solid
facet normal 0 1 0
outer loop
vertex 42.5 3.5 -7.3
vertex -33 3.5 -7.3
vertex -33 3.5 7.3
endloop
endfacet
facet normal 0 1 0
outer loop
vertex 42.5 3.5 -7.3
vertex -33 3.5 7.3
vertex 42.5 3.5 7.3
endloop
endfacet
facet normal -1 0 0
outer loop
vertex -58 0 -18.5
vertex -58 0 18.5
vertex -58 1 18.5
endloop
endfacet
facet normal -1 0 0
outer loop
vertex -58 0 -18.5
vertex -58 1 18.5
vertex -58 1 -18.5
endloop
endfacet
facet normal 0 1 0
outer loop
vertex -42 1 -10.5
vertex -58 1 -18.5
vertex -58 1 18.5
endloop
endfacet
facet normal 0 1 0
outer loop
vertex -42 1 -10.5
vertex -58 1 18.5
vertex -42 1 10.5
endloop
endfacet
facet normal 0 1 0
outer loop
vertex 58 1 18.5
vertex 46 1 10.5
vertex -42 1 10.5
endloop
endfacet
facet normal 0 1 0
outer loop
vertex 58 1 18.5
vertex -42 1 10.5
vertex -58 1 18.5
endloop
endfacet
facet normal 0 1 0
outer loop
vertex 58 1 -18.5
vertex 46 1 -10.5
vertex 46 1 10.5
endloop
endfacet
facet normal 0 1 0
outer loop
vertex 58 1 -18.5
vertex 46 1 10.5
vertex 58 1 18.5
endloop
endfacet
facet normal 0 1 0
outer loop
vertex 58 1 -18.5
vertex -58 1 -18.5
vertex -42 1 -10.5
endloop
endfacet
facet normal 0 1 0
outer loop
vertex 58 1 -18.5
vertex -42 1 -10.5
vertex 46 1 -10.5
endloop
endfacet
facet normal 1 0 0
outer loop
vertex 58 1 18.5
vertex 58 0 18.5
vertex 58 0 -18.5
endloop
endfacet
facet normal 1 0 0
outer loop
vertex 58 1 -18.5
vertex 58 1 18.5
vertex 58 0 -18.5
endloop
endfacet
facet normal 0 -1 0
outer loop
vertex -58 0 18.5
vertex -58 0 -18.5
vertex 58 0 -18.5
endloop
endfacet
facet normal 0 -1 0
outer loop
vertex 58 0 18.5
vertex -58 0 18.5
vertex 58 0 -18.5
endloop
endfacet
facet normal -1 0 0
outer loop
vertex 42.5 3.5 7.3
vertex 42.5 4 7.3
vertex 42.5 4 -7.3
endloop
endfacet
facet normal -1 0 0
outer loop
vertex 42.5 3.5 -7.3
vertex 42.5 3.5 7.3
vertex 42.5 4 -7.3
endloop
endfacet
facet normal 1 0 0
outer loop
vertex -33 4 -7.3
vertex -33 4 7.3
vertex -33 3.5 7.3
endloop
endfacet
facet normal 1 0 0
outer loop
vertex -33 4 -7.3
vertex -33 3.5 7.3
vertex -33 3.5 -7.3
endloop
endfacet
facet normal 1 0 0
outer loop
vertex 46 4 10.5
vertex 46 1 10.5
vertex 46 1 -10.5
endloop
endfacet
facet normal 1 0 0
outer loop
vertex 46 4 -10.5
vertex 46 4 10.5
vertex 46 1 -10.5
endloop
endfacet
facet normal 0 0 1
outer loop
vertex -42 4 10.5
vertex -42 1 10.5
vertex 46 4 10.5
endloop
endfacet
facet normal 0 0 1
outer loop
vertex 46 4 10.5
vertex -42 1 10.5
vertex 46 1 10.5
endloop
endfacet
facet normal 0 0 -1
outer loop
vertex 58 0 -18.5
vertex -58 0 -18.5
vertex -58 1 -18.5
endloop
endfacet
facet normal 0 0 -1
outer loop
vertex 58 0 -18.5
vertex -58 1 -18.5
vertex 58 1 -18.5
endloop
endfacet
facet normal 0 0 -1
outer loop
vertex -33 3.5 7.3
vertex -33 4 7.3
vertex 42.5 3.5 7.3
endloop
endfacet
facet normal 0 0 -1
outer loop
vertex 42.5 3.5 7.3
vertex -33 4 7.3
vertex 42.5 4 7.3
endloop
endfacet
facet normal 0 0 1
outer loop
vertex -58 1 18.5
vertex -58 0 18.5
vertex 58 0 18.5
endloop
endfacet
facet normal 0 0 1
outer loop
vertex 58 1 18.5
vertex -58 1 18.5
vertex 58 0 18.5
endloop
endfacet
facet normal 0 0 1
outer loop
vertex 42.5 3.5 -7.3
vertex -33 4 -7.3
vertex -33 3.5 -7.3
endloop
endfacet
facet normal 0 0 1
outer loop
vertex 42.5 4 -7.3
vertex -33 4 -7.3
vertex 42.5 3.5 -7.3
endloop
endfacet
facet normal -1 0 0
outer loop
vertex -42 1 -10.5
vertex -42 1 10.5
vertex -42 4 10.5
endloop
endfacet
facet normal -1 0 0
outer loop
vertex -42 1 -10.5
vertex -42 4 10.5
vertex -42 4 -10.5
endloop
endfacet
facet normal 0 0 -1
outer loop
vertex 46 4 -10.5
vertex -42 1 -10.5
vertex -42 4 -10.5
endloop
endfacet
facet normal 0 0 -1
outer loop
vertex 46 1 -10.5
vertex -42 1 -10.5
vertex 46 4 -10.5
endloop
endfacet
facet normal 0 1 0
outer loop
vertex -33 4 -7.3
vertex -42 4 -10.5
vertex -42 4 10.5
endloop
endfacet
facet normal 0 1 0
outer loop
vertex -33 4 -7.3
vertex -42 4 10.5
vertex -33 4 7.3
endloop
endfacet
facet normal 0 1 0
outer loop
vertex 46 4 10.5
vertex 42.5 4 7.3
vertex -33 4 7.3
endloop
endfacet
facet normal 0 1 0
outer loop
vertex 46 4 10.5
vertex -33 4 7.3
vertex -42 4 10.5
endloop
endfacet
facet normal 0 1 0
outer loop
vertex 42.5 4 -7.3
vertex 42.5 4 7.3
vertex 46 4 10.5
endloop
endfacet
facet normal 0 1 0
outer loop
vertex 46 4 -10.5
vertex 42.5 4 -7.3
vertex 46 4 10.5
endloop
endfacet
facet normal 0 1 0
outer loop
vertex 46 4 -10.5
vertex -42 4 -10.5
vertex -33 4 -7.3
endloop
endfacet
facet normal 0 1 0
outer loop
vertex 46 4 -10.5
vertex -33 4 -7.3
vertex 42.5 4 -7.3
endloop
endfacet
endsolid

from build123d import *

# Parameters (mm, degrees)
SKETCH1_W           = 116
SKETCH1_H           = 37
BOSS_EXTRUDE1_DEPTH = 1
SKETCH2_W           = 88
SKETCH2_H           = 21
BOSS_EXTRUDE2_DEPTH = 3
SKETCH3_W           = 75.5
SKETCH3_H           = 14.6
CUT_EXTRUDE1_DEPTH  = 0.5


with BuildPart() as part:
    # Sketch1 → Boss-Extrude1 (new body)
    with BuildSketch(Plane(origin=(0, 0, 0), x_dir=(1, 0, 0), z_dir=(0, 1, 0))):
        Rectangle(SKETCH1_W, SKETCH1_H)
    extrude(amount=BOSS_EXTRUDE1_DEPTH)

    # Sketch2 → Boss-Extrude2 (add)
    with BuildSketch(Plane(origin=(0, 1, 0), x_dir=(1, 0, 0), z_dir=(0, 1, 0))):
        with Locations((2, 0)):
            Rectangle(SKETCH2_W, SKETCH2_H)
    extrude(amount=BOSS_EXTRUDE2_DEPTH)

    # Sketch3 → Cut-Extrude1 (cut)
    with BuildSketch(Plane(origin=(0, 4, 0), x_dir=(1, 0, 0), z_dir=(0, 1, 0))):
        with Locations((4.75, 0)):
            Rectangle(SKETCH3_W, SKETCH3_H)
    extrude(amount=-CUT_EXTRUDE1_DEPTH, mode=Mode.SUBTRACT)


solid = part.part
